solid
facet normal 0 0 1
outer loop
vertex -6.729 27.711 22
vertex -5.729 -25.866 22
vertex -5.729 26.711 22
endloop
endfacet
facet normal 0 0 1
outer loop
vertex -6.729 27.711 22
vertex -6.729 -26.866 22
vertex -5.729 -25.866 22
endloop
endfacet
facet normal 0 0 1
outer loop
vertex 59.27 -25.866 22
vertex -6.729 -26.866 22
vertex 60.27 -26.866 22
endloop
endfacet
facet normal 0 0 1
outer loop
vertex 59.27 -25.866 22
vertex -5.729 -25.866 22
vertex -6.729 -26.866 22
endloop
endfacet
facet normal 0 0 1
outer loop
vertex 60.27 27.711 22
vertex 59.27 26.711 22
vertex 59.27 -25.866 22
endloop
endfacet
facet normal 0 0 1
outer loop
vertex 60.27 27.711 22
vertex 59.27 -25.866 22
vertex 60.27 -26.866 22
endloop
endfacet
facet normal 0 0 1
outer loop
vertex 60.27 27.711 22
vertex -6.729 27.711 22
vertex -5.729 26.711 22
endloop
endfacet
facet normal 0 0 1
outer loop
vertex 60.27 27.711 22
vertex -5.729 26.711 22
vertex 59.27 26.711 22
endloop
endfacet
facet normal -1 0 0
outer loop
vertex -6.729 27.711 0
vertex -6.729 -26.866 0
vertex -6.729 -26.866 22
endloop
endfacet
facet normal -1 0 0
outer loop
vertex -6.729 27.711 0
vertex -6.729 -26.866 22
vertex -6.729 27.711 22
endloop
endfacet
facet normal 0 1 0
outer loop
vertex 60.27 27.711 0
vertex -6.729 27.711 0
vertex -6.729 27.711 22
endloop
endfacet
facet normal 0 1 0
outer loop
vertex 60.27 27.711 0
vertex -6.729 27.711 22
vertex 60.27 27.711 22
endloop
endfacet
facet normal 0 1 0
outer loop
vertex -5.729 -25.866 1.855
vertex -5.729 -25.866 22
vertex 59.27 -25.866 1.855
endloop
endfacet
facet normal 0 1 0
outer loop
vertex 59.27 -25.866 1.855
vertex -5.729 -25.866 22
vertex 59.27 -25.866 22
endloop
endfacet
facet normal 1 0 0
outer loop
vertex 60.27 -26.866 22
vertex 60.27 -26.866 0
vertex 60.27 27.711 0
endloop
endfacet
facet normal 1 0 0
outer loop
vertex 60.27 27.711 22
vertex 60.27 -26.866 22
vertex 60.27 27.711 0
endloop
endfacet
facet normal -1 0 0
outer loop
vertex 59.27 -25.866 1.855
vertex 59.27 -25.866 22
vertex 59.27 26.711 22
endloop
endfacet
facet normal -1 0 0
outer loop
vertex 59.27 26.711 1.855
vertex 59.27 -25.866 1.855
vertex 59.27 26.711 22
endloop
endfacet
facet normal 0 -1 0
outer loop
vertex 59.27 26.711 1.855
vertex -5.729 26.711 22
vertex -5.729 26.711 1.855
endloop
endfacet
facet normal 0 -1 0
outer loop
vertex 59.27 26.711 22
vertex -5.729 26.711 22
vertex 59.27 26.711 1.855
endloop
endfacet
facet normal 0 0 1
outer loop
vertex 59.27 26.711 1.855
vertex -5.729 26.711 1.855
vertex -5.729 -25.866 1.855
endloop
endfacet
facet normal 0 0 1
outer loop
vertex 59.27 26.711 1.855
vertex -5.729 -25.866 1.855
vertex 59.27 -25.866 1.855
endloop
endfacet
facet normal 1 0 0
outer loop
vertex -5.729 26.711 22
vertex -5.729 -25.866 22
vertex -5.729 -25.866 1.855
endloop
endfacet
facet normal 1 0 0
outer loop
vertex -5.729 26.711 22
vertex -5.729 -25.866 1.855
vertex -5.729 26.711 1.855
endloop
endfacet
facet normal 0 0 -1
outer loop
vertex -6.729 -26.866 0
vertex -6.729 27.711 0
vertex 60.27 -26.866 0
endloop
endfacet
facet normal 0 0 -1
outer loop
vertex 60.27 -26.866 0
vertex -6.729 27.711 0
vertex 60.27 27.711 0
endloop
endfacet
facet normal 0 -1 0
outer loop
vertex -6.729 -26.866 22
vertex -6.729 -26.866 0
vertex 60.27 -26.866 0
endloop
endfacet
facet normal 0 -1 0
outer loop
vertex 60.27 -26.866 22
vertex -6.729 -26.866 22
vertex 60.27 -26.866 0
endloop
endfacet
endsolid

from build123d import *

# Parameters (mm, degrees)
F0_W     = 120.775796473
F0_H     = 92.5770886242
F1_DEPTH = 22
F2_DEPTH = 53.776
F3_DEPTH = 38
F5_W     = 64.999796473
F5_H     = 52.5770886242
F6_DEPTH = 20.1452


with BuildPart() as f1:
    # F0 (on Top) → F1 (new body)
    with BuildSketch(Plane.XY):
        with Locations((-0.1175701618, 19.4224845618)):
            Rectangle(F0_W, F0_H)
    extrude(amount=F1_DEPTH)

    # F2 (cut): a face of the model
    f2_faces = [f1.faces().sort_by_distance(p)[0] for p in [
        (-60.5054683983, 19.4224845618, 11),
    ]]
    extrude(f2_faces, amount=-F2_DEPTH, mode=Mode.SUBTRACT)

    # F3 (cut): a face of the model
    f3_faces = [f1.faces().sort_by_distance(p)[0] for p in [
        (26.7704298382, 65.7110288739, 11),
    ]]
    extrude(f3_faces, amount=-F3_DEPTH, mode=Mode.SUBTRACT)

    # F5 (on face) → F6 (cut)
    with BuildSketch(Plane.XY.offset(22)):
        with Locations((26.7704298382, 0.4224845618)):
            Rectangle(F5_W, F5_H)
    extrude(amount=-F6_DEPTH, mode=Mode.SUBTRACT)


solid = f1.part
